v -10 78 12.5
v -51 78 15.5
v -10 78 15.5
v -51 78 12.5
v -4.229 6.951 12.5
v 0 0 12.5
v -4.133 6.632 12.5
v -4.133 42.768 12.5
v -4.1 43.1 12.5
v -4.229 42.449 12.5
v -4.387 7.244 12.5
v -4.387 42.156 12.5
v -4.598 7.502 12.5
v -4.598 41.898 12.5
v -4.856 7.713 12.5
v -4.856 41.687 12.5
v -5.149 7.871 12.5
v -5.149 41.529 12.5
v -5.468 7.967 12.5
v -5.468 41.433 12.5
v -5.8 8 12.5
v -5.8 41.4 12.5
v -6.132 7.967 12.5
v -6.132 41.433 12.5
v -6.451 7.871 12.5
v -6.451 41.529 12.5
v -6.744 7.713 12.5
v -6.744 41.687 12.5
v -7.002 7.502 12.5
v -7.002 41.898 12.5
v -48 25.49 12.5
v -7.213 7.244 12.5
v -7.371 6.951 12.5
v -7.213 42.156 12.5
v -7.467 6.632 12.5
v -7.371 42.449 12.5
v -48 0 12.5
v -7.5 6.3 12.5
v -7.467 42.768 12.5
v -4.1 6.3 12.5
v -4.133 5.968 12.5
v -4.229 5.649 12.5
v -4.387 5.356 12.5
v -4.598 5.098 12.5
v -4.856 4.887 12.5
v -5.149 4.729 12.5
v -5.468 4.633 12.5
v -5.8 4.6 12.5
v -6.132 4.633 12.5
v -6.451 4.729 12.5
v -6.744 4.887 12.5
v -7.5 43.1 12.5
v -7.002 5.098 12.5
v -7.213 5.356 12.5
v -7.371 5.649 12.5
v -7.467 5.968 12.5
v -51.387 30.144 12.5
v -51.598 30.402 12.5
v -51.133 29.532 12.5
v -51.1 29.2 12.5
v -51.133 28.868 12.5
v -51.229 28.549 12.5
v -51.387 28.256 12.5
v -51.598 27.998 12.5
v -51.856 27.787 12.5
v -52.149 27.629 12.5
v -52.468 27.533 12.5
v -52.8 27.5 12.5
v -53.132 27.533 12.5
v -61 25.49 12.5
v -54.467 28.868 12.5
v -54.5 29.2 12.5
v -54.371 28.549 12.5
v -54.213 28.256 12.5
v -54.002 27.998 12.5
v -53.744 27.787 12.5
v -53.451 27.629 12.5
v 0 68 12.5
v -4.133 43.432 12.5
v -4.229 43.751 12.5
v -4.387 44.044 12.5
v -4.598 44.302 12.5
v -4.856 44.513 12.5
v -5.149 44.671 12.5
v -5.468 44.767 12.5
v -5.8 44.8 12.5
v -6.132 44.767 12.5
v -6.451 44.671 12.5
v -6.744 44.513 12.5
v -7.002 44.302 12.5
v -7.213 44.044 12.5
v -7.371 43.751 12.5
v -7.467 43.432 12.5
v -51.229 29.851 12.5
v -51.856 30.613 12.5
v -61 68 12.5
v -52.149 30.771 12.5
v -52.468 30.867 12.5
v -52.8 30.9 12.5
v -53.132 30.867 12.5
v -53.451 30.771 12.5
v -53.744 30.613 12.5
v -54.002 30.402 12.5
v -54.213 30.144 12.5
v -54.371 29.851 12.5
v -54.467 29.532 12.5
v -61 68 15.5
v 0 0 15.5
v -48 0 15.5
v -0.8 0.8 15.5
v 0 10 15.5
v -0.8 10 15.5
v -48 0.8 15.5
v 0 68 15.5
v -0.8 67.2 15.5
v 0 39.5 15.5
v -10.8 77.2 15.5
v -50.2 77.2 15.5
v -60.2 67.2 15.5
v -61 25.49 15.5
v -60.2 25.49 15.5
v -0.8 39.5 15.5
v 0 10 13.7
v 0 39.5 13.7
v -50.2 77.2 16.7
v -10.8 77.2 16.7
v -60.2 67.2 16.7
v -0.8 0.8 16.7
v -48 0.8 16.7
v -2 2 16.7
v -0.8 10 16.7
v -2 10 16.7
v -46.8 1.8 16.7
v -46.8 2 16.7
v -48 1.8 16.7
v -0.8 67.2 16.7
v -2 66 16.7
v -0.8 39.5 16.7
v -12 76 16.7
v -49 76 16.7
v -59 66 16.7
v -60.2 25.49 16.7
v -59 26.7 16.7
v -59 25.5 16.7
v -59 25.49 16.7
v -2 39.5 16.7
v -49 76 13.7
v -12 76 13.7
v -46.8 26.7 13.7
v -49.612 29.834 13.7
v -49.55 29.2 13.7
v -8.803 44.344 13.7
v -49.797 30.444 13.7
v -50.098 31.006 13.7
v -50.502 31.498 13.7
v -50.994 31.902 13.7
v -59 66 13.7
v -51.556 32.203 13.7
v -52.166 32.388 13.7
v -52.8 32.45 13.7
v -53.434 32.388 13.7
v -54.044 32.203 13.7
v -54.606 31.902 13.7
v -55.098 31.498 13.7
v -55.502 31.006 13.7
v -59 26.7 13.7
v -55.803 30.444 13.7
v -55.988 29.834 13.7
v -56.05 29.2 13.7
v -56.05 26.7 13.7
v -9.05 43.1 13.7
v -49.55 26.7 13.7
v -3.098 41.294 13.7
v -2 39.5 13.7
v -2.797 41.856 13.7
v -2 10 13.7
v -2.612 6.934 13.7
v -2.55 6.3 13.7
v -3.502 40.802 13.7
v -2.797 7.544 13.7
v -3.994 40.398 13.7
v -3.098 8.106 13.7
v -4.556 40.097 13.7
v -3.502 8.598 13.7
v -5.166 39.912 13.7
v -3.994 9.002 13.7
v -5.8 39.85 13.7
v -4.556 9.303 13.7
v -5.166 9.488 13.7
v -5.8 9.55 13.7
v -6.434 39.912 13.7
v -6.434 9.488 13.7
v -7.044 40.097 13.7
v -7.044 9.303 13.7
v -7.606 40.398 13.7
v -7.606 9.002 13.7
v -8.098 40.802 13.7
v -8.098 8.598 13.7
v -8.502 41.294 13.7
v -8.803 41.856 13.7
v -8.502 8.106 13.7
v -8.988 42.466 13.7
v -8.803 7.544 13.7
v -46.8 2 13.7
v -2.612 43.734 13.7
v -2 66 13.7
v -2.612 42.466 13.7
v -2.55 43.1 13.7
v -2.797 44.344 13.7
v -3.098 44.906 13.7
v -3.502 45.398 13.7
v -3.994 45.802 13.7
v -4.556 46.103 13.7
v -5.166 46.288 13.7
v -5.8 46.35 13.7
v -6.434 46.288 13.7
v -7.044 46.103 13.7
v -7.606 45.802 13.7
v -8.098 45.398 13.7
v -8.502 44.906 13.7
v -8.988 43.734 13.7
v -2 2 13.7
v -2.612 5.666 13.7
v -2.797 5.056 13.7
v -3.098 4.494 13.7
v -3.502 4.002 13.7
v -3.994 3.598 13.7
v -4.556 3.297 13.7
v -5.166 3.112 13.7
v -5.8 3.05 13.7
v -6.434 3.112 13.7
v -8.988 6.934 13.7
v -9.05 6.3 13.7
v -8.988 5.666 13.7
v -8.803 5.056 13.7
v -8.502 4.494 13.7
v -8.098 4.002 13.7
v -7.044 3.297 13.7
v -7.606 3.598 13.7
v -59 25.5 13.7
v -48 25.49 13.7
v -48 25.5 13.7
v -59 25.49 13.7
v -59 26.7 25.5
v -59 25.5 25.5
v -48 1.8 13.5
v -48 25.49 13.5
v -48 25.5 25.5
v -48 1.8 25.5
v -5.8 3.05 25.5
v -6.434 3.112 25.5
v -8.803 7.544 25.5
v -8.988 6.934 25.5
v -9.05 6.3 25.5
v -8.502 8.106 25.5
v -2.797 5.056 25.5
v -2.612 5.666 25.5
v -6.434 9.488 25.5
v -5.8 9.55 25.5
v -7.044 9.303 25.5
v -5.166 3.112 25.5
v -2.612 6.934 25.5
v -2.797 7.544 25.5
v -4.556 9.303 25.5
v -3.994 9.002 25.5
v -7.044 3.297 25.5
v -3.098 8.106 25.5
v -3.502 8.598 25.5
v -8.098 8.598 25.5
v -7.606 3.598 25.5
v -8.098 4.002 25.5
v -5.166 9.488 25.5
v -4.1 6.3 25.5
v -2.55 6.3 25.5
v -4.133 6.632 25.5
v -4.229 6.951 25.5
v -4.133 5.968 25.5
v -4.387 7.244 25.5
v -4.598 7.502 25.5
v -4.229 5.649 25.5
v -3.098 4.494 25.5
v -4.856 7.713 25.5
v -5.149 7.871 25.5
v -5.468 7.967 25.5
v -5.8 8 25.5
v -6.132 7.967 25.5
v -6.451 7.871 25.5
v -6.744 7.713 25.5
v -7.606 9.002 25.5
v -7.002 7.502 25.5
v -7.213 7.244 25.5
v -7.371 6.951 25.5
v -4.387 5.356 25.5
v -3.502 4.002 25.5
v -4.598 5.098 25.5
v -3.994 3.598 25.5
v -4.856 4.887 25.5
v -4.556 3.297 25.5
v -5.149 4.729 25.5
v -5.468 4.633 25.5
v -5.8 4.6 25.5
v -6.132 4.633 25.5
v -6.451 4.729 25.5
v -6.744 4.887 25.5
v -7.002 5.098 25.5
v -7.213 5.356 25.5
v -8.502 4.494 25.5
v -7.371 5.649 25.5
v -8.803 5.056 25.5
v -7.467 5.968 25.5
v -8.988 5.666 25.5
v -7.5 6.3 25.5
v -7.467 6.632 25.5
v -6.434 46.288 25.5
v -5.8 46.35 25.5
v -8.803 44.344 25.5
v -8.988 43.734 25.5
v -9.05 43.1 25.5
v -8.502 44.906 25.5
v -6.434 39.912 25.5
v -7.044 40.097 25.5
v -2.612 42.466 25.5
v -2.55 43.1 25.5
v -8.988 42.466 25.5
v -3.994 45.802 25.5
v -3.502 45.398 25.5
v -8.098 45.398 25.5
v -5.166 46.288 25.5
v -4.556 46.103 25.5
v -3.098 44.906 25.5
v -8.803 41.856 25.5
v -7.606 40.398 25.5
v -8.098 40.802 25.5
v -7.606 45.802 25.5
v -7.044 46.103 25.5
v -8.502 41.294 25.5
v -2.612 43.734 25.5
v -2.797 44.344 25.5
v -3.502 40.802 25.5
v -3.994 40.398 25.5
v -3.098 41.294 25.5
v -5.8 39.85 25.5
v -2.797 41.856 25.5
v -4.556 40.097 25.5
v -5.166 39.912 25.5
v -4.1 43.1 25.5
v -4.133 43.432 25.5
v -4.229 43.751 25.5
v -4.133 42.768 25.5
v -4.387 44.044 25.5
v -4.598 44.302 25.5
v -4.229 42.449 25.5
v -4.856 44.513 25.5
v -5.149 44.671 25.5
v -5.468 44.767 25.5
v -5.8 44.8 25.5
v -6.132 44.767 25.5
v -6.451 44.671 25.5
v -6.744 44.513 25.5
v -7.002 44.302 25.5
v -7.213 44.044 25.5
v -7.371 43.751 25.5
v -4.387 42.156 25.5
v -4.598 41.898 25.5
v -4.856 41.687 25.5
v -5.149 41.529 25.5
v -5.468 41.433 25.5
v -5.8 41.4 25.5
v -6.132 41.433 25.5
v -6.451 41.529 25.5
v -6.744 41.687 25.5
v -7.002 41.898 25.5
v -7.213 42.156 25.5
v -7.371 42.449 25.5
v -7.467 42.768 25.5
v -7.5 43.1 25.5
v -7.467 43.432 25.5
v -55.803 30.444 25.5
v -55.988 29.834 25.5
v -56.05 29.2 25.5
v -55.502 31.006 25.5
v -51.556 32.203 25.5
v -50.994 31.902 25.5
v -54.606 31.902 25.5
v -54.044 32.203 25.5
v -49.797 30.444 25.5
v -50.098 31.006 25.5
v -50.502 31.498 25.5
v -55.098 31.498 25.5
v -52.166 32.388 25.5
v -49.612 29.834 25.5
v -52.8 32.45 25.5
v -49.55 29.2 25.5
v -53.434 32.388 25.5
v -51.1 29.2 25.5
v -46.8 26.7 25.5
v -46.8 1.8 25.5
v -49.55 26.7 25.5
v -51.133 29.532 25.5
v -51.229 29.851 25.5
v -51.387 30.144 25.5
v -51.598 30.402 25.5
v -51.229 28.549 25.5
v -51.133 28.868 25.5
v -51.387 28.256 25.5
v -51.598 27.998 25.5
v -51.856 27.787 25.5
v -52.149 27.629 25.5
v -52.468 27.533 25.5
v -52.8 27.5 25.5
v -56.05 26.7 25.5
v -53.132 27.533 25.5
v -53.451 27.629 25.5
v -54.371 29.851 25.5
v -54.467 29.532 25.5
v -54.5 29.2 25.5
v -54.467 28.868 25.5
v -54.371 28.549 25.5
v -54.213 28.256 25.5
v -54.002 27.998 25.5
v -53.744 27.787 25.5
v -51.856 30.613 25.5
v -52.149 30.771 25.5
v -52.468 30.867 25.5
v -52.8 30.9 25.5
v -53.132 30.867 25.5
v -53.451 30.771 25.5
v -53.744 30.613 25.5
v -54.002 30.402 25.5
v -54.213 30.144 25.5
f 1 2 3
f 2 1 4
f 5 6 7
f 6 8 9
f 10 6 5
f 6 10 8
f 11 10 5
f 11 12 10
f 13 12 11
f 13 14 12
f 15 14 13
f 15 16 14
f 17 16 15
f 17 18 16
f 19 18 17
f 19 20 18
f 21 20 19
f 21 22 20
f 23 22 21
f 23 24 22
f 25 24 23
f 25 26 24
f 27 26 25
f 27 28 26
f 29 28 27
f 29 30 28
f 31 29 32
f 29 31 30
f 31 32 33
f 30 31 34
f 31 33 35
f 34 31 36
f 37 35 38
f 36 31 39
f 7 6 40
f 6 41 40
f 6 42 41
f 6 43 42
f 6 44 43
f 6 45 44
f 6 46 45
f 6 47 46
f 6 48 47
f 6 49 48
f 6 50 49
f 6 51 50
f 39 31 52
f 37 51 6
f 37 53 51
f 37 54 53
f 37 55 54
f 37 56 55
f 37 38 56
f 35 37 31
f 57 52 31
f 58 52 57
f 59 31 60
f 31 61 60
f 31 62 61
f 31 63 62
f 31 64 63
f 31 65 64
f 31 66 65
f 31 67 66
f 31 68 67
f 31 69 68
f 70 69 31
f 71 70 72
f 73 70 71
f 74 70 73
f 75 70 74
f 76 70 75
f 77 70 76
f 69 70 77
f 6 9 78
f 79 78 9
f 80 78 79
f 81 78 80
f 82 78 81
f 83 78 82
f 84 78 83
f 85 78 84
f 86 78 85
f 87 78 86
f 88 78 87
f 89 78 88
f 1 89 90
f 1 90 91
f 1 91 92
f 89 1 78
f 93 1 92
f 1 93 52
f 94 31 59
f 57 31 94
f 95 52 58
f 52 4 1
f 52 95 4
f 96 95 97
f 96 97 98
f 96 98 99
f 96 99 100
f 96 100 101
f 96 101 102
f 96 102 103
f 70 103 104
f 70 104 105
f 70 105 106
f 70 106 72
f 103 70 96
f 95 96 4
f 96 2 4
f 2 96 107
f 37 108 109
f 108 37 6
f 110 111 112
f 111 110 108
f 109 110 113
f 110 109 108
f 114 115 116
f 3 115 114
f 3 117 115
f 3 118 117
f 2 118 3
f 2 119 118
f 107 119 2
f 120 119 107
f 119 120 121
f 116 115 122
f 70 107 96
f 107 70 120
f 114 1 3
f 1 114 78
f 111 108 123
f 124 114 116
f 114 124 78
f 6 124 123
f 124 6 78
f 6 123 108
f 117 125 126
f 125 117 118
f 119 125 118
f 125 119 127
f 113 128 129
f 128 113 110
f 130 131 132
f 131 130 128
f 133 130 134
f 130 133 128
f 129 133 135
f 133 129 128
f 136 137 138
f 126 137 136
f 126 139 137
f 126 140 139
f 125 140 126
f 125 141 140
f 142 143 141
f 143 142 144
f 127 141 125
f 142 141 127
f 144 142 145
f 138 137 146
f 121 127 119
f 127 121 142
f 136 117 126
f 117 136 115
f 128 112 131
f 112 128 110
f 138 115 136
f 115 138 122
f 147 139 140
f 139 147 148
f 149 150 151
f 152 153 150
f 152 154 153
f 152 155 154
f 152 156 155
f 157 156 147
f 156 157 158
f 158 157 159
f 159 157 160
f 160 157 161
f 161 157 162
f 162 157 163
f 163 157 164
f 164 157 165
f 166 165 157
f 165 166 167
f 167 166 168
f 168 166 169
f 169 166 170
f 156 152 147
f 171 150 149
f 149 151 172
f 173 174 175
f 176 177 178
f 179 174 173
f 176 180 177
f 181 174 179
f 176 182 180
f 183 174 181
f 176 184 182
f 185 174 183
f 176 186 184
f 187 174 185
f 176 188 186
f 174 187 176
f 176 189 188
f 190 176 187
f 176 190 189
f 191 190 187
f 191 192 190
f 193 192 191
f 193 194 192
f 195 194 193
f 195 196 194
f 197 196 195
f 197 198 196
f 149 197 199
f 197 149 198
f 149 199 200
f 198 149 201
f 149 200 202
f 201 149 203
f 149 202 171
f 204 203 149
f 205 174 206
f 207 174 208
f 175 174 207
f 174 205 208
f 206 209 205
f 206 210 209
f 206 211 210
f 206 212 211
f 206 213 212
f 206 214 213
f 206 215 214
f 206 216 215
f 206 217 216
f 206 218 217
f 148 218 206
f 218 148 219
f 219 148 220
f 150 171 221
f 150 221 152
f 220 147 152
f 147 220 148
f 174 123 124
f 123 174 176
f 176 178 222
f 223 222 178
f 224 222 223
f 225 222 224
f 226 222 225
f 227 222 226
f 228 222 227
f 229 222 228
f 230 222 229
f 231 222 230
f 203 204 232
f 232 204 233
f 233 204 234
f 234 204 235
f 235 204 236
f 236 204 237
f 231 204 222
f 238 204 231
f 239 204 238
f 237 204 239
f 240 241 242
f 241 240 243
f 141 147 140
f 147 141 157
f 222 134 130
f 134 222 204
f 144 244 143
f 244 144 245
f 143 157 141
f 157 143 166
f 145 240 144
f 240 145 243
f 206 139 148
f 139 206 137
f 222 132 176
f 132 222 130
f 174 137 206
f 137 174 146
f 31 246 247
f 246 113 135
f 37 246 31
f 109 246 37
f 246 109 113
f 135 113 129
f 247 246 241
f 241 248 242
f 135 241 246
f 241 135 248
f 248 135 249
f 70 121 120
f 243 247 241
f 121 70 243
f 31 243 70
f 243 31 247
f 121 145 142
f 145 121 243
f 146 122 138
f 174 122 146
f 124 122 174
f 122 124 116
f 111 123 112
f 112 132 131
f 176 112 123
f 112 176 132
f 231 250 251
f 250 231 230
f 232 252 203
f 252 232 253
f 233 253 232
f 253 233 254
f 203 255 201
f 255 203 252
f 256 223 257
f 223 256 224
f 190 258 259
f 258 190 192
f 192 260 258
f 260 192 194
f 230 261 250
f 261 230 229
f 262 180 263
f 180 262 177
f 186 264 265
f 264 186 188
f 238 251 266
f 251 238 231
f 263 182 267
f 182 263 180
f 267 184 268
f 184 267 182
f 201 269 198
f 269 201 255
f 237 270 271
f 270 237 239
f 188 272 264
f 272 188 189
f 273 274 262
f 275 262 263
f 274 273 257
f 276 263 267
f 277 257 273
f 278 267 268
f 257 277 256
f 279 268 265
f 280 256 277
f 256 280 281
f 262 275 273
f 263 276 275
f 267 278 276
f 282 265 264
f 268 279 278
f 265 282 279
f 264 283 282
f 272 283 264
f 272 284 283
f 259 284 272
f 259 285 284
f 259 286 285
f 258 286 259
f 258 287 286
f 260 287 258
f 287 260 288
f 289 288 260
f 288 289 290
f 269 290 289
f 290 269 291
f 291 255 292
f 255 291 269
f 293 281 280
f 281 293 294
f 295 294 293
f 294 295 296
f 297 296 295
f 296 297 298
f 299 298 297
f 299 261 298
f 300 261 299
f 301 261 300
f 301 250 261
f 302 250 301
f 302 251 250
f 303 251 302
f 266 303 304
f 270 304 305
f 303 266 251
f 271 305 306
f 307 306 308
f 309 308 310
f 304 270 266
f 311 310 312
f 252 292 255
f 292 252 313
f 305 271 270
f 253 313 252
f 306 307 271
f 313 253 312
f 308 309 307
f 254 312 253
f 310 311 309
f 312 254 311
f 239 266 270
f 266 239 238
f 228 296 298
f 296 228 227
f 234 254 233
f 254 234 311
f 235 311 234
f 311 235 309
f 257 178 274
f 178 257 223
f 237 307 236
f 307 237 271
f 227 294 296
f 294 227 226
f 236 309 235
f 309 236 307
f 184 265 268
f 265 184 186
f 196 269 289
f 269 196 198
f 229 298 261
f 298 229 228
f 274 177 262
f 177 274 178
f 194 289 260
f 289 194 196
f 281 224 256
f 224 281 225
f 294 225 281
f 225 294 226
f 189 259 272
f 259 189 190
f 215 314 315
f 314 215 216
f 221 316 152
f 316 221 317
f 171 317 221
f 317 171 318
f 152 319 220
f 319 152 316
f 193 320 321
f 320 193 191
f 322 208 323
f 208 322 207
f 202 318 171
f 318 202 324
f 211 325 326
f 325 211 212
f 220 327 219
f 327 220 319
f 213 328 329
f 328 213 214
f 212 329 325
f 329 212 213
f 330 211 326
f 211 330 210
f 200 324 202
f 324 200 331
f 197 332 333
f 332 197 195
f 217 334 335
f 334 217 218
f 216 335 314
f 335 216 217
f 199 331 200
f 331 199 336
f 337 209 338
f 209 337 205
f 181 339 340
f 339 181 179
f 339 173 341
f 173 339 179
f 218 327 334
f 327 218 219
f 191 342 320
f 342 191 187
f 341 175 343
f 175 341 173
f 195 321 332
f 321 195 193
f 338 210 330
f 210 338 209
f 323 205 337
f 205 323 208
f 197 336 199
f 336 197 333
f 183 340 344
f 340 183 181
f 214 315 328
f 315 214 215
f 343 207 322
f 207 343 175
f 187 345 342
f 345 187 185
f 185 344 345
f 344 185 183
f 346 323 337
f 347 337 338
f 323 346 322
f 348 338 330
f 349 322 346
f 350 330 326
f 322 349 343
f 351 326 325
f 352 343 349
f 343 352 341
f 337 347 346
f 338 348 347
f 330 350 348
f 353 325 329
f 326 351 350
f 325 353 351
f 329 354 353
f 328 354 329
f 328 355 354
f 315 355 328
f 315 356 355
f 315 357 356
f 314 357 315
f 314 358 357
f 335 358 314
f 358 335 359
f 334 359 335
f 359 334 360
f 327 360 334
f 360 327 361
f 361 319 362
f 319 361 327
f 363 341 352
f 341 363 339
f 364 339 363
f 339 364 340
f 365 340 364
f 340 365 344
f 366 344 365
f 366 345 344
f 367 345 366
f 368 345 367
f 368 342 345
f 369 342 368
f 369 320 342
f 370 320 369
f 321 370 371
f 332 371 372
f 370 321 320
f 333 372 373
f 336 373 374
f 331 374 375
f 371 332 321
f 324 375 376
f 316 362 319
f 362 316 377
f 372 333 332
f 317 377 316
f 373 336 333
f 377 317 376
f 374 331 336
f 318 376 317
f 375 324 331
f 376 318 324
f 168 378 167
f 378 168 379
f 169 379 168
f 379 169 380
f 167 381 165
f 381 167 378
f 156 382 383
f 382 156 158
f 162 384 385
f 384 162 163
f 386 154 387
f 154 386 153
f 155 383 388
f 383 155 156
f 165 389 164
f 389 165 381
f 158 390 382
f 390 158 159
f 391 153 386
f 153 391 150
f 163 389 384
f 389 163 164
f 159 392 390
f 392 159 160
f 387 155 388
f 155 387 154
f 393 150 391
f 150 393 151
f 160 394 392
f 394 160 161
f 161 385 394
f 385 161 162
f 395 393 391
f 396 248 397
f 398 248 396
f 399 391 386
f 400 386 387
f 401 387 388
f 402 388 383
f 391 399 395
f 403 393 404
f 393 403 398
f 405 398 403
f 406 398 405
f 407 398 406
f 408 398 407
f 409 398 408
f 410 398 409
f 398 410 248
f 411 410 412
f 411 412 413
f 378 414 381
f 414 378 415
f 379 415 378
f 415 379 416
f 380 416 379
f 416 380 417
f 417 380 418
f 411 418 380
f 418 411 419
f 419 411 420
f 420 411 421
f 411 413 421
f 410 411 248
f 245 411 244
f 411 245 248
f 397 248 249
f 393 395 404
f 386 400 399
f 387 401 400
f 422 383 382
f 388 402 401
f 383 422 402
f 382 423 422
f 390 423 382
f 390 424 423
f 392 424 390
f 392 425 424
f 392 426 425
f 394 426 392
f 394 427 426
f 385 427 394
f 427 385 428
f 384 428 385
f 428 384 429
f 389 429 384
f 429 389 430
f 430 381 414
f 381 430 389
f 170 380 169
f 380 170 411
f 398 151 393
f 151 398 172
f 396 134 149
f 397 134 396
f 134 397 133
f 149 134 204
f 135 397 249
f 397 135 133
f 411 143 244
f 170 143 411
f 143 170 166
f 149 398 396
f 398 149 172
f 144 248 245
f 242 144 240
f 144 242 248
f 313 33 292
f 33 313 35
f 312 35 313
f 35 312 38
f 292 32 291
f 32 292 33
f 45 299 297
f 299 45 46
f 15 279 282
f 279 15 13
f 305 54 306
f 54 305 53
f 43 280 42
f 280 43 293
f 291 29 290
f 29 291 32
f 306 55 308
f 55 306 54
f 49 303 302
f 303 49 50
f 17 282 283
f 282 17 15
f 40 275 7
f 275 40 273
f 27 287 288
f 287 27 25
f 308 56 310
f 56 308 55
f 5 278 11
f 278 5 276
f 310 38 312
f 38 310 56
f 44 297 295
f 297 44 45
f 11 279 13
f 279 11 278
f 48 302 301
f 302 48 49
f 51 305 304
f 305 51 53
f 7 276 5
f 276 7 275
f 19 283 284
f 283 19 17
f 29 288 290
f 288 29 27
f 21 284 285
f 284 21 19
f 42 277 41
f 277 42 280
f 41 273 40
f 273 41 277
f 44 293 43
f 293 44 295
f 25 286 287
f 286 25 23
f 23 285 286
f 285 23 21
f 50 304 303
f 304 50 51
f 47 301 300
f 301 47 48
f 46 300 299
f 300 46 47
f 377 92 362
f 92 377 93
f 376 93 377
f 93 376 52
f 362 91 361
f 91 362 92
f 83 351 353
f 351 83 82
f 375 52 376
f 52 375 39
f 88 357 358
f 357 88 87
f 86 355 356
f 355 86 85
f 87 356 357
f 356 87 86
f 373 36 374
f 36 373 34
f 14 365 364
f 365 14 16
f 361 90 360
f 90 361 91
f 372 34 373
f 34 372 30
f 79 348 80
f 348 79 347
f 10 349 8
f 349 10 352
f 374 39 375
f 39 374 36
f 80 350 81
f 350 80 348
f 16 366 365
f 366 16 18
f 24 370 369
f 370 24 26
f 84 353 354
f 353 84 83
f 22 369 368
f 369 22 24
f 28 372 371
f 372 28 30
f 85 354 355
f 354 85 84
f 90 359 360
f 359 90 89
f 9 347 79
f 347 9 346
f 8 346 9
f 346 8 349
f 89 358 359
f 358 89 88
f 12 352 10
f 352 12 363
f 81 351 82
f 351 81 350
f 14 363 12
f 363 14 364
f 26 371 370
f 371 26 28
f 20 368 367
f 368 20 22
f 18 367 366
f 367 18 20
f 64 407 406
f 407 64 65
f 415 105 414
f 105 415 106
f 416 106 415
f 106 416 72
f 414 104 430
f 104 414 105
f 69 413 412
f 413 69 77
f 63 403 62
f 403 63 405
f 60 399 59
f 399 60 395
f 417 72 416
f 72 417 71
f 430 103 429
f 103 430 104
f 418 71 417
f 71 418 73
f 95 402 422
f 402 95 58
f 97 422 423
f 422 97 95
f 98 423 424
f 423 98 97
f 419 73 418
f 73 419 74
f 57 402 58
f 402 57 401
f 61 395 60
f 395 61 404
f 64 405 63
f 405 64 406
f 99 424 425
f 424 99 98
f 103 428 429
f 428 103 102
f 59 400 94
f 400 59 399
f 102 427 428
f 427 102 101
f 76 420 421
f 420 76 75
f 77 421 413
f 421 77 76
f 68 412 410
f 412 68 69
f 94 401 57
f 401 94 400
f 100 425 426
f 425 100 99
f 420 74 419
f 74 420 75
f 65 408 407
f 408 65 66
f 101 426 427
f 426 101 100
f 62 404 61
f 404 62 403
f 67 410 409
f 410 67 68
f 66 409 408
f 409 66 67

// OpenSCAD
size = [61, 78, 13];

h1 = 0.4;

module foo(height=10, h1=0) {
    shell = [
        [h1             , h1],
        [size[0]-h1     , h1],
        [size[0]-h1     , size[1]-10-h1],
        [size[0]-10-h1   , size[1]-h1],
        [10+h1           , size[1]-h1],
        [h1             , size[1]-10-h1]
    ];
         
    linear_extrude(height=height) polygon(points = shell);
}

module case() {
    union() {
        difference() {
            foo(height=15, h1=0);    
            translate([0, 0, 15-0.8]) foo(height=10, h1=0.4);  
            translate([0, 0, 1.2]) foo(height=20, h1=1.2);    
        }   
        cube([5.9, 9.95, 3]);
        cube([9.45, 6.4, 3]);
        translate([0.5, 39.45, 0]) cube([5.4, 7.3, 3]);
        translate([52.5, 25.55, 0]) cube([8, 7.3, 3]);
        
        translate([2, 2.5, 1]) {    
            translate([3.8, 3.8, 0]) color("green") cylinder($fn=32, h=2, d=7.3);
            translate([3.8, 40.6, 0]) color("green") cylinder($fn=32, h=2, d=7.3);
            translate([50.8, 26.7, 0]) color("green") cylinder($fn=32, h=2, d=7.3);
        }
    }
}

module board() {
    translate([2, 2.5, 1]) {
        color("black") import("/Users/volzotan/GIT/timebox/enclosure/controller25case/controller2.5.dxf");
        
        translate([3.8, 3.8, 0]) color("green") cylinder($fn=32, h=10, d=3.3);
        translate([3.8, 40.6, 0]) color("green") cylinder($fn=32, h=10, d=3.3);
        translate([50.8, 26.7, 0]) color("green") cylinder($fn=32, h=10, d=3.3);

        translate([3.8, 3.8, 0]) color("green") cylinder($fn=32, h=1, d=7.3);
        translate([3.8, 40.6, 0]) color("green") cylinder($fn=32, h=1, d=7.3);
        translate([50.8, 26.7, 0]) color("green") cylinder($fn=32, h=1, d=7.3);
    }    
}

module bottom() {
    difference() {
        case();
        //translate([8.5, -1, 2]) cube([17, 3, 3]);
        translate([-1, 12, 5]) cube([3, 27.5, 20]);
        translate([-1, 10, 6.5]) cube([3, 10, 20]);
        translate([-1, 13, 6.4]) rotate([0, 90, 0]) cylinder(h=3, d=6, $fn=32);
        
        translate([2, 2.5, -1]) {    
            translate([3.8, 3.8, 0]) color("green") cylinder($fn=32, h=10, d=3.4);
            translate([3.8, 40.6, 0]) color("green") cylinder($fn=32, h=10, d=3.4);
            translate([50.8, 26.7, 0]) color("green") cylinder($fn=32, h=10, d=3.4);
        
            translate([3.8, 3.8, 0]) color("green") cylinder($fn=6, h=2, d=6.5);
            translate([3.8, 40.6, 0]) color("green") cylinder($fn=6, h=2, d=6.5);
            translate([50.8, 26.7, 0]) color("green") cylinder($fn=6, h=2, d=6.5);
        }
        
        translate([48, -0.01, 5]) {
            cube([20, 25, 20]);
        }
        
        translate([9, -0.01, 4.7]) {
            cube([17, 3, 4]);
        }
    }

    translate([2, 2.5, 1]) {    
        translate([3.8, 3.8, 0]) cylinder($fn=32, h=0.2, d=7);
        translate([3.8, 40.6, 0]) cylinder($fn=32, h=0.2, d=7);
        translate([50.8, 26.7, 0])cylinder($fn=32, h=0.2, d=7);
    }
}

//bottom();

//board();

translate([0, 0, 15.5]) rotate([0, 180, 0]) top();

// ---

module top() {
    difference() {
        union() {
            difference() {
                union() {
                    translate([0, 0, 0]) foo(height=3, h1=0);
                    translate([0, 0, 0-1.2]) foo(height=2, h1=0.8);
                }
                translate([0, 0, -10+(3-1.2)]) foo(height=10, h1=2);
                
                // buttons
                translate([48, 0-0.01, -5]) cube([20, 25.5, 10]);
                
                translate([-2, 12, -10+(3-1.2)]) cube([5, 27.5, 10]);
                translate([-2, 10, -10+(3-1.2)]) cube([5, 10, 10]);
                
            }
            
            translate([46.8, 1.8, -11.8+(3-1.2)]) cube([1.2, 24.8, 12]);
            translate([46.8, 25.5, -11.8+(3-1.2)]) cube([12.2, 1.2, 12]);
           
            translate([2, 2.5, -10]) {
                translate([3.8, 3.8, 0]) color("green") cylinder($fn=32, h=13, d=6.5);
                translate([3.8, 40.6, 0]) color("green") cylinder($fn=32, h=13, d=6.5);
                translate([50.8, 26.7, 0]) color("green") cylinder($fn=32, h=13, d=6.5);
                translate([47.55, 23.2, 0]) cube([6.5, 3.5, 13]);
                //translate([50.5, 23.4, 0]) cube([6.5, 6.5, 13]);
            }
        }
        
        translate([2, 2.5, -11]) {
            translate([3.8, 3.8, 0]) color("green") cylinder($fn=32, h=15, d=3.4);
            translate([3.8, 40.6, 0]) color("green") cylinder($fn=32, h=15, d=3.4);
            translate([50.8, 26.7, 0]) color("green") cylinder($fn=32, h=15, d=3.4);
        }
    }
}
